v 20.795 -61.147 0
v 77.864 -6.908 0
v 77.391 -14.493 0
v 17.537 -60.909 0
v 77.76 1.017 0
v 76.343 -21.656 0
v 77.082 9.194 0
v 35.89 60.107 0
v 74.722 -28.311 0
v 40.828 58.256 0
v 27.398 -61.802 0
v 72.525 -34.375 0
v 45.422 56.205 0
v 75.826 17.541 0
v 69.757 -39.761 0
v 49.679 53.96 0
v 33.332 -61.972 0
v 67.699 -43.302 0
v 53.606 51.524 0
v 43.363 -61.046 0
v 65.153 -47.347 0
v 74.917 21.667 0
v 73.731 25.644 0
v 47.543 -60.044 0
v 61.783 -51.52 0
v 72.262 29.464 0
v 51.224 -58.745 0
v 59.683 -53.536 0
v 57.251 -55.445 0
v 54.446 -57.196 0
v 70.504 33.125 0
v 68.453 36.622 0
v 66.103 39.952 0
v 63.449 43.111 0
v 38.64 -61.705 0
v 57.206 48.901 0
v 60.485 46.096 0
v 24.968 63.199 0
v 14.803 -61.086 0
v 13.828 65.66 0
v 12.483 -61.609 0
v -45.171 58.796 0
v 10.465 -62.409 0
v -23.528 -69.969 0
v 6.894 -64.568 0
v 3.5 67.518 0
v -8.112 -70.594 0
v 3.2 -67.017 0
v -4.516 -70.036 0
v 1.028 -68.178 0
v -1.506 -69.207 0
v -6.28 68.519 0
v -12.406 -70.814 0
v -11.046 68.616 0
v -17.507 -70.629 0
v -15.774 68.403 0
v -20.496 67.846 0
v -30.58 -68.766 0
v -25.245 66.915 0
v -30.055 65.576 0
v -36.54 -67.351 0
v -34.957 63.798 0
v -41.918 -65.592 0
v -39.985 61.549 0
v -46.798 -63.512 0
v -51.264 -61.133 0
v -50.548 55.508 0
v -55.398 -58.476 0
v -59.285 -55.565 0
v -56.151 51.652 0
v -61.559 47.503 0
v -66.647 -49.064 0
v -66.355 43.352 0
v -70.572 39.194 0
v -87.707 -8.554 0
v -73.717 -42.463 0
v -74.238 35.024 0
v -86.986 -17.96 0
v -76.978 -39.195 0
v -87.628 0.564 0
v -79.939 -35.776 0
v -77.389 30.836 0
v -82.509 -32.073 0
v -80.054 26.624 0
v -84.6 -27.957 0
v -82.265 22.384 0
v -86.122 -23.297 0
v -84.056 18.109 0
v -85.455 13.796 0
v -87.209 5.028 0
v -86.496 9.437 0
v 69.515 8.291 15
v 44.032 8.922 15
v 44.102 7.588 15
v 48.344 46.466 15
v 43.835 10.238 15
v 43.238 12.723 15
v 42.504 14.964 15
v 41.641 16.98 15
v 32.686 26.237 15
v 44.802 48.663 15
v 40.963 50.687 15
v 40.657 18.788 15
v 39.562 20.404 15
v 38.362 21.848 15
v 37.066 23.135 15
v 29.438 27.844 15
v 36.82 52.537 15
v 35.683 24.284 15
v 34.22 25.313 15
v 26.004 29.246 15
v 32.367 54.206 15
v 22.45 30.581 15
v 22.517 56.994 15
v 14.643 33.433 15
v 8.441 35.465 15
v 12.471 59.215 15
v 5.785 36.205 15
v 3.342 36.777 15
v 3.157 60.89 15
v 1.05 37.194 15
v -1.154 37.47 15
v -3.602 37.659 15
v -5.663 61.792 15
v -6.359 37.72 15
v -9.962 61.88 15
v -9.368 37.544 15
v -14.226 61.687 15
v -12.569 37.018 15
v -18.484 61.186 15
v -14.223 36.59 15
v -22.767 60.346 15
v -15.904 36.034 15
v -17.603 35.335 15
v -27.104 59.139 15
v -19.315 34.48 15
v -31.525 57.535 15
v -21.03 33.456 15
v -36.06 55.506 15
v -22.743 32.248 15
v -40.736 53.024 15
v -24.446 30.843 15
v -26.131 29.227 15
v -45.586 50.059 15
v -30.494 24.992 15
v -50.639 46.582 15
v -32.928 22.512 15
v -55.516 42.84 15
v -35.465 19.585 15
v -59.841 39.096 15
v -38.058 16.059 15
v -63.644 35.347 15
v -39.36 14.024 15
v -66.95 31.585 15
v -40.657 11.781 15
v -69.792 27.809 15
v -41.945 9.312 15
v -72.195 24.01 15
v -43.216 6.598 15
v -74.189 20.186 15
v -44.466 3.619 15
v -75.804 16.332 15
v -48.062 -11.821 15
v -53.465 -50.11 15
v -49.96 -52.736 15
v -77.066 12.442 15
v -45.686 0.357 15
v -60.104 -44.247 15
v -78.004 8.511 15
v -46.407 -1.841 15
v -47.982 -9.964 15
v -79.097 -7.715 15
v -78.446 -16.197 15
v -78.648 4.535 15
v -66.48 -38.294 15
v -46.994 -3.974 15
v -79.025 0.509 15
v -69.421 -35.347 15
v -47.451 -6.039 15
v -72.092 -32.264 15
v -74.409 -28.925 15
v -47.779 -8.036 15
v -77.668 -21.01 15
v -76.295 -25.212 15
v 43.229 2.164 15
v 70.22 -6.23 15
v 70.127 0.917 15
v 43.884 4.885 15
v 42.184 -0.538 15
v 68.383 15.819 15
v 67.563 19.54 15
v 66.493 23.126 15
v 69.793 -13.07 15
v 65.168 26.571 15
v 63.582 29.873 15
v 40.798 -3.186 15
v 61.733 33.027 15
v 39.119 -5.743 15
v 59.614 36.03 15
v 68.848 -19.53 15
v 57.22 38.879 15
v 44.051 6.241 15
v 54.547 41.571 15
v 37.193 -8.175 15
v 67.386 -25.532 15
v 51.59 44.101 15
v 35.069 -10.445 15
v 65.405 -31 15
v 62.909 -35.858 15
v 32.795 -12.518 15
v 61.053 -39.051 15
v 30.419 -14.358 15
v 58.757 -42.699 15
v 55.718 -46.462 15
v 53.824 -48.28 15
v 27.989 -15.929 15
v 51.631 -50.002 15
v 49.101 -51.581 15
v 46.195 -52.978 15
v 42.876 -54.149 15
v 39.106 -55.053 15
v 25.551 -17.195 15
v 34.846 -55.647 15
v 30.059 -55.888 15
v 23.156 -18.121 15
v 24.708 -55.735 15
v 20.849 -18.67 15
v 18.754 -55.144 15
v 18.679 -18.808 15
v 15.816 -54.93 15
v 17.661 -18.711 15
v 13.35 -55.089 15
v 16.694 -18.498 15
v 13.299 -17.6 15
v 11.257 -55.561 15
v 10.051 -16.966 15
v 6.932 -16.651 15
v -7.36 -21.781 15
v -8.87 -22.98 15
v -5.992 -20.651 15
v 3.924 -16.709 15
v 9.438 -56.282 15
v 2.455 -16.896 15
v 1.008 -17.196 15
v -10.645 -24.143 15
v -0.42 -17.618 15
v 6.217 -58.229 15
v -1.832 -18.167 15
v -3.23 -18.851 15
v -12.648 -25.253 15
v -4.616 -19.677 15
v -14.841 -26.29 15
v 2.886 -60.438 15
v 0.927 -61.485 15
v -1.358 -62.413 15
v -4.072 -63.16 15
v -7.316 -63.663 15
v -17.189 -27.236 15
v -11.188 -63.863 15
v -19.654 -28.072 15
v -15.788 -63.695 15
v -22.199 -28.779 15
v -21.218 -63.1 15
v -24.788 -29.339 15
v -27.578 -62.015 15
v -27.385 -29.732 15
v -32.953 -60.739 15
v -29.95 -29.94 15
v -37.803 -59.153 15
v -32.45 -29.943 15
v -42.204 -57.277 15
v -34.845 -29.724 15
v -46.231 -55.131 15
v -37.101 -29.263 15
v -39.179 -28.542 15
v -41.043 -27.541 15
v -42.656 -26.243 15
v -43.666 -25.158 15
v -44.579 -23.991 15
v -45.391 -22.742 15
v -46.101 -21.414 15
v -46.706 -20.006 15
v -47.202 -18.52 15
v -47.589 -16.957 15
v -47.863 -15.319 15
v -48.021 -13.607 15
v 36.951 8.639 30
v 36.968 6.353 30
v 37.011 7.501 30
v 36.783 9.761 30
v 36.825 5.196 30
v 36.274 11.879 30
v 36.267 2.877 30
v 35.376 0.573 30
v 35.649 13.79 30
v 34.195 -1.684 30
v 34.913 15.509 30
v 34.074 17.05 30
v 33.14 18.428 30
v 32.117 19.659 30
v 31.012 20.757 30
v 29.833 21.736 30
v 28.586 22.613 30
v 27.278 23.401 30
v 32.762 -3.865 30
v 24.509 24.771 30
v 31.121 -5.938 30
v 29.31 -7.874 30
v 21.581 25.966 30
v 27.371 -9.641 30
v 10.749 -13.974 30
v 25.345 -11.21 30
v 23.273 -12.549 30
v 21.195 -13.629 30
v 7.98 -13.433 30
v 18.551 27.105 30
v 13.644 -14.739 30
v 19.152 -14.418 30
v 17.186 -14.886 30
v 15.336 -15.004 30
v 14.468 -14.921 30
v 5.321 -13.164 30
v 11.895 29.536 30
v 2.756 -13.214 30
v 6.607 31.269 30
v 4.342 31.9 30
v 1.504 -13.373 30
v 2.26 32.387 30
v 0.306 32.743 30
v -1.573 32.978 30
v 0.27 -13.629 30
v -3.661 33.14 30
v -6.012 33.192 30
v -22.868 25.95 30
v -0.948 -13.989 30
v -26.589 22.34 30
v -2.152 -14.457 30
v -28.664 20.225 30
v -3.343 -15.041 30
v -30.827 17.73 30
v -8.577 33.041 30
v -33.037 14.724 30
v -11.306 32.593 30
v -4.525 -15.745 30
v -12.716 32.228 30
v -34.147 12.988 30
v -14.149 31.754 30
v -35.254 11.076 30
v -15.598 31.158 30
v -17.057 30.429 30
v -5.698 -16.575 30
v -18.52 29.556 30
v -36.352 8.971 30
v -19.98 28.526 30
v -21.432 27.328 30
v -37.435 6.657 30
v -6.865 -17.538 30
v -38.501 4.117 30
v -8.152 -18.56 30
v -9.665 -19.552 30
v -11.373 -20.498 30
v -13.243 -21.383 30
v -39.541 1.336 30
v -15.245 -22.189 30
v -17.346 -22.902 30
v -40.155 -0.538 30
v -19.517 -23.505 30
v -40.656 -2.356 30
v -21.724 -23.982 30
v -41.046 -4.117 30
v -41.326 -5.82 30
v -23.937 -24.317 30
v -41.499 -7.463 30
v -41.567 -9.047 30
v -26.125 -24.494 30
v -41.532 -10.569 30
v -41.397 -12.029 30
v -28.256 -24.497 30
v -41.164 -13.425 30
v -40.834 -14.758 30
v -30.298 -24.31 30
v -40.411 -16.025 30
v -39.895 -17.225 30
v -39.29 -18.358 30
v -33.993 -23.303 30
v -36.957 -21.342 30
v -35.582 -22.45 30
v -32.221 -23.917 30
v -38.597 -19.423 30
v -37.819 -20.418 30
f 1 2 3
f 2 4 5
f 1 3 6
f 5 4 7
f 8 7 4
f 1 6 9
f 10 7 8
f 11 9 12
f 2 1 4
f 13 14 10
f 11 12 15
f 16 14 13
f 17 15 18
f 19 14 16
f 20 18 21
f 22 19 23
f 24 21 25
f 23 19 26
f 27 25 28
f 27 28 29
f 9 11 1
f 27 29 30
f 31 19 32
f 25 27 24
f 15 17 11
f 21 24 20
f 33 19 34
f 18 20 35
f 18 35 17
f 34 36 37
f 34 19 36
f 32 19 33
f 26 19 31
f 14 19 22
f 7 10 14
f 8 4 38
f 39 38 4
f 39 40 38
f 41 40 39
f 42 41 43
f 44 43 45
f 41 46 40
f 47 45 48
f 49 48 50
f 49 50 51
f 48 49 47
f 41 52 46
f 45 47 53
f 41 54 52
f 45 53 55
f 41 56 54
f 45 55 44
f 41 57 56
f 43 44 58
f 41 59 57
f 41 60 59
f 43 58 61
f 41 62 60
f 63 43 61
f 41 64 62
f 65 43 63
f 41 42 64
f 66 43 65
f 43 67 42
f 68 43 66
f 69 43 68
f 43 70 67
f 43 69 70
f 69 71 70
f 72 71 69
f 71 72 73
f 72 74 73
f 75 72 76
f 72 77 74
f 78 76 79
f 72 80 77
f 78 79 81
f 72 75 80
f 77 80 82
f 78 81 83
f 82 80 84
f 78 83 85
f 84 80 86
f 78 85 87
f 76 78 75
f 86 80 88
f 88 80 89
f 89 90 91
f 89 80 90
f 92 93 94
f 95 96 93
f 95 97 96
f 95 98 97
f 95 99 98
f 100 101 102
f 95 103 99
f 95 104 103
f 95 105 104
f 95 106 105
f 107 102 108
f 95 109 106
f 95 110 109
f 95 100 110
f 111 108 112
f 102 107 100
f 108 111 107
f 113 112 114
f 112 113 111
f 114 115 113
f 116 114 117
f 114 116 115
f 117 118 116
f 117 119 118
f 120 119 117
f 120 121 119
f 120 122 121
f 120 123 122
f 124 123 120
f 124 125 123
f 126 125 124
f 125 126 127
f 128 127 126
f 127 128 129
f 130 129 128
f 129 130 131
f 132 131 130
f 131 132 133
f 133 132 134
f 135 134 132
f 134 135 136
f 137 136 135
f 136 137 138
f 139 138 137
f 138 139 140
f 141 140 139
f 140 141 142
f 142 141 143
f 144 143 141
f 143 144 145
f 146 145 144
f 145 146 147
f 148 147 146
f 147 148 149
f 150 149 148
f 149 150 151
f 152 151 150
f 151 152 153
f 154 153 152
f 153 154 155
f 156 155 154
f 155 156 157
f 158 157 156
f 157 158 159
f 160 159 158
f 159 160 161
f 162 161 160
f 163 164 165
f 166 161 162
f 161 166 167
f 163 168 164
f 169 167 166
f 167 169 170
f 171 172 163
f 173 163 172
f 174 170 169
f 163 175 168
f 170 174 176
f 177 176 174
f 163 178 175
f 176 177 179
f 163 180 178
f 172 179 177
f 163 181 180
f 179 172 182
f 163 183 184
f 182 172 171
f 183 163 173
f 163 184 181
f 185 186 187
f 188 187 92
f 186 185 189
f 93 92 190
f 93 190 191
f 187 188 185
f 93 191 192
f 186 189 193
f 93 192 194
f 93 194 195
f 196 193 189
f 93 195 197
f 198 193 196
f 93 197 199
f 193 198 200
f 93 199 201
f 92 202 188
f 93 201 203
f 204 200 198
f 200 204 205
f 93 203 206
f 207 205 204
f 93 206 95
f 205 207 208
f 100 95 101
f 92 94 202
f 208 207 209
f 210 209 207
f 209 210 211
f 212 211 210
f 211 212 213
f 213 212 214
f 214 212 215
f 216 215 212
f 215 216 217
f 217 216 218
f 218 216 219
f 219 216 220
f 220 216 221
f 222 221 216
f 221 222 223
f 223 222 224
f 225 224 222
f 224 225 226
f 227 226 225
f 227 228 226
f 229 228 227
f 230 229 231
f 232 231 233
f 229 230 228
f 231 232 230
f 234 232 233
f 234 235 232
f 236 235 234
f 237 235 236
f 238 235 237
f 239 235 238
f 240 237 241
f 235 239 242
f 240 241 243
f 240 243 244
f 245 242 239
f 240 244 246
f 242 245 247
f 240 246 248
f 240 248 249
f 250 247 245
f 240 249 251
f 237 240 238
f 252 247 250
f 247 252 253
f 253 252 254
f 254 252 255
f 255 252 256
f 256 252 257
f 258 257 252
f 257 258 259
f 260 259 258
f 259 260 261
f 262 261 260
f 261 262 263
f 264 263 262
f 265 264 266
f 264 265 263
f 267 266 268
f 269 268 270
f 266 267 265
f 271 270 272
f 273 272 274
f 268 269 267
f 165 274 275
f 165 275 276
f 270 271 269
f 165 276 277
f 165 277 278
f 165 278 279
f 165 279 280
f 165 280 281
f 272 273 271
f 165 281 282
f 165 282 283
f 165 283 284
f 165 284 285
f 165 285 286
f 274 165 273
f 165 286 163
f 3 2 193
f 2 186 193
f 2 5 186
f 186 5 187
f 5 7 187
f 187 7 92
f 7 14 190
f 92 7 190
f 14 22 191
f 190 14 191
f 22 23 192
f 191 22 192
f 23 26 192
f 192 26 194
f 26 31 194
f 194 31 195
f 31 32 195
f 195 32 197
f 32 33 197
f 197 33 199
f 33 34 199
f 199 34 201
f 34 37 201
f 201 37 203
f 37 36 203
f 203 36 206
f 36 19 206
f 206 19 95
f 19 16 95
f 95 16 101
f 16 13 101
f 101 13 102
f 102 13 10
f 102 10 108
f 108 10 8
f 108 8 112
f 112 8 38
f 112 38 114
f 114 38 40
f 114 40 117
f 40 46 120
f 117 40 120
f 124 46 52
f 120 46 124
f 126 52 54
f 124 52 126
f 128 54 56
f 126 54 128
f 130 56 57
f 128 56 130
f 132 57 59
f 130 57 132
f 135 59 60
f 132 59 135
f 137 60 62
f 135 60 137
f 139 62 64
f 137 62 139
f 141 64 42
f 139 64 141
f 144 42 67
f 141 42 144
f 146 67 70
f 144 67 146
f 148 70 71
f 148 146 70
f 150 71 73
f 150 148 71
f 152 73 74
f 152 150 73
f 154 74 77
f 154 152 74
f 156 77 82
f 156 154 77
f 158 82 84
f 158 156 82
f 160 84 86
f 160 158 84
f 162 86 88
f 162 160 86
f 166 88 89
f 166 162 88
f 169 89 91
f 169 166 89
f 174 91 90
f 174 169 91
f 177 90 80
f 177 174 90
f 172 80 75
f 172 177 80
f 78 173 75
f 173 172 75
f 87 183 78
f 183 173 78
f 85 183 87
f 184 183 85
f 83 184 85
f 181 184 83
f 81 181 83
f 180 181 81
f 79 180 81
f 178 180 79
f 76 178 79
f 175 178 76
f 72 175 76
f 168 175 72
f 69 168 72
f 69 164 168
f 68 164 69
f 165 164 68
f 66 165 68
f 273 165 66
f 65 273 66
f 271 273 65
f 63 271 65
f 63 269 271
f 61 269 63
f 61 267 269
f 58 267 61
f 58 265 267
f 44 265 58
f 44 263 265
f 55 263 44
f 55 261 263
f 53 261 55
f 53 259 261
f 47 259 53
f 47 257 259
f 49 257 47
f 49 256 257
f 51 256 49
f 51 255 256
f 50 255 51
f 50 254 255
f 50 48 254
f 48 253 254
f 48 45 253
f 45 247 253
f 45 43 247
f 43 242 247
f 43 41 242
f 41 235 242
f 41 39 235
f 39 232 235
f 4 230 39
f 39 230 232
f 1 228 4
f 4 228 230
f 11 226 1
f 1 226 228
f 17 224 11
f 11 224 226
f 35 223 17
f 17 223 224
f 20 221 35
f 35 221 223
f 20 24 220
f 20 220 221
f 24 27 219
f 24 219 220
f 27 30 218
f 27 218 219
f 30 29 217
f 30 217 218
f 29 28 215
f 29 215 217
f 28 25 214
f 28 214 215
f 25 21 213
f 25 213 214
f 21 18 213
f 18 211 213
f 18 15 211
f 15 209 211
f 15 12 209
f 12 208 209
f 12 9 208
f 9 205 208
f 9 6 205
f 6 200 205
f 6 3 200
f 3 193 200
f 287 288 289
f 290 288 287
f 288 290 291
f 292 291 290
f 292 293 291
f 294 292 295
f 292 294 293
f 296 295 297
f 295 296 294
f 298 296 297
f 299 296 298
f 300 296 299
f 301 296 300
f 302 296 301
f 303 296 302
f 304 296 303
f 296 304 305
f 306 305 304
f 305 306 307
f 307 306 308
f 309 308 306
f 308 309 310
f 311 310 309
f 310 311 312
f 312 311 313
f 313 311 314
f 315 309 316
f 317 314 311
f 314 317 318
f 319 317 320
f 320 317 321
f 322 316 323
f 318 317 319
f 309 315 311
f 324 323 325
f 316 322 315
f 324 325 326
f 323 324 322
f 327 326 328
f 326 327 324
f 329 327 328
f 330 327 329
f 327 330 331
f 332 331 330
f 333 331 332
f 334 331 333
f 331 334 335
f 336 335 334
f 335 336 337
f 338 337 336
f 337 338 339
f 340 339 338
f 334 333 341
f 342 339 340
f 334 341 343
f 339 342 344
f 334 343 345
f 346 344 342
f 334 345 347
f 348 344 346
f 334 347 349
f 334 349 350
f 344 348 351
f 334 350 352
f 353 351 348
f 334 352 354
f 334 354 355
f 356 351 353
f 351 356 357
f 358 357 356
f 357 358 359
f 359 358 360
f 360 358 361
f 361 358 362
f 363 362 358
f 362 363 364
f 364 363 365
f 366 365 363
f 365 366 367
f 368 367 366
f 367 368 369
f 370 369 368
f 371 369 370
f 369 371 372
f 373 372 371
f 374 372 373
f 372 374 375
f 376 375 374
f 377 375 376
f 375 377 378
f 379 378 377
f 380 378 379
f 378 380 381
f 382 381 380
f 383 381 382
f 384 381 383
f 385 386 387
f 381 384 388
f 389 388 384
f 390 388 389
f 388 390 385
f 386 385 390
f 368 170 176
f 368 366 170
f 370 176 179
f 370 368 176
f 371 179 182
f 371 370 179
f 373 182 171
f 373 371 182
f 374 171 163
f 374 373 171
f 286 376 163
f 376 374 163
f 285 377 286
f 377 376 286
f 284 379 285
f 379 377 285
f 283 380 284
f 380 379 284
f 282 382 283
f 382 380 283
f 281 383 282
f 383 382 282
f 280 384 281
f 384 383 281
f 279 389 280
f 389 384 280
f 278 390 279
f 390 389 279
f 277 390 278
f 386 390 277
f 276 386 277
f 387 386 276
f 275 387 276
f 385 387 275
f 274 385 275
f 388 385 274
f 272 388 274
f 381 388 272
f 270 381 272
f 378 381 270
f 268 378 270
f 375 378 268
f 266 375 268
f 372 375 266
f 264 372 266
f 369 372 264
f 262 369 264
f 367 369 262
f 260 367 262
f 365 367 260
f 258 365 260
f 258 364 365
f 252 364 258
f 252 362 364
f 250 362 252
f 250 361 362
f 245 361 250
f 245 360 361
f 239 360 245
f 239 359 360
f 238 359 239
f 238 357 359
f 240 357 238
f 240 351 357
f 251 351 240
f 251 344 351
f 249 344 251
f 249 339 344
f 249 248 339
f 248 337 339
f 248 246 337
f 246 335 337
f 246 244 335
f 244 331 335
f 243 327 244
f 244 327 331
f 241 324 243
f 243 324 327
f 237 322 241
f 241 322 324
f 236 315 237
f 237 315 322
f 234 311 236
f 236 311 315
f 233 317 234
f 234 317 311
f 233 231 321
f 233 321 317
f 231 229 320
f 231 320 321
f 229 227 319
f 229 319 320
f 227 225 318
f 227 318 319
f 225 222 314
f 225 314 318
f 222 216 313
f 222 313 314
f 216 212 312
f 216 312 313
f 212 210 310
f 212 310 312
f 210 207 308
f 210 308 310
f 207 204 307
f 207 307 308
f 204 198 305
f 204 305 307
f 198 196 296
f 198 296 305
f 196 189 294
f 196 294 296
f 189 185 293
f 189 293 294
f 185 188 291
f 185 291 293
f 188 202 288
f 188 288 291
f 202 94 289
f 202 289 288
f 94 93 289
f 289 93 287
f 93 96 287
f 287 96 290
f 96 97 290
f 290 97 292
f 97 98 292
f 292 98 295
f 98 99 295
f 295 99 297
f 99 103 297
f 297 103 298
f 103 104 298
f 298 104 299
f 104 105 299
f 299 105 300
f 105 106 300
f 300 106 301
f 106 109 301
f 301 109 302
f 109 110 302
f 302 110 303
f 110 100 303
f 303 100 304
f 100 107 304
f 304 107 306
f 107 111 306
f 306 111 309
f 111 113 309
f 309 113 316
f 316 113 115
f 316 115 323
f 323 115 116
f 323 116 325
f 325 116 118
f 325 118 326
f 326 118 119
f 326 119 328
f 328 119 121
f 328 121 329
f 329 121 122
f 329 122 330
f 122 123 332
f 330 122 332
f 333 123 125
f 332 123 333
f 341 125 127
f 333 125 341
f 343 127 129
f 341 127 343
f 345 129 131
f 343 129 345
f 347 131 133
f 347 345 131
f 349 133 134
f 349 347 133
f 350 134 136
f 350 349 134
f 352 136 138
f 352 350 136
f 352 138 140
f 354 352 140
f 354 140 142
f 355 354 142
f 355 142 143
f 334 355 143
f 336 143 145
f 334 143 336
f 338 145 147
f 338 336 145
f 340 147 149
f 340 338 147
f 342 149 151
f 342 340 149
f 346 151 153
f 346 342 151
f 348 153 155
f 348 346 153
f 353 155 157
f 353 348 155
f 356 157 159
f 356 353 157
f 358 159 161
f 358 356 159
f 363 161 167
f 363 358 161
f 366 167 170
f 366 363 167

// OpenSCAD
// file: hill-4.scad
use <hillpolygon.scad>

% translate([0,0,155/2]) cube(size=[240, 153, 155], center=true); 

hill4();

module hill4() {
   hillFromPolygon(angle=25) hill4Polygon();
}

// Note: There is something slightly amiss with this polygon, resulting hill ends up with two
//       volumes (?).
module hill4Polygon() {
   // Apologies for the hackish adjustments ... just wanted to get the job done!
   translate([-10,0,0]) rotate([0,0,55]) translate([75,-10,0]) scale([0.8,0.8]) 
      polygon(points=
         [[-140.478, 124.045], [-137.230, 125.810], [-133.814, 127.261],
         [-130.249, 128.407], [-126.551, 129.260], [-118.827, 130.135],
         [-110.782, 129.975], [-102.554, 128.873], [-94.282, 126.918],
         [-86.104, 124.202], [-78.161, 120.815], [-70.590, 116.849],
         [-63.530, 112.395], [-57.120, 107.543], [-51.500, 102.384],
         [-46.807, 97.010], [-43.182, 91.511], [-40.761, 85.978], [-40.047,
         83.228], [-39.685, 80.503], [-38.803, 70.788], [-37.372, 61.707],
         [-35.232, 53.266], [-32.221, 45.469], [-30.339, 41.813], [-28.180,
         38.321], [-25.722, 34.993], [-22.947, 31.830], [-19.833, 28.831],
         [-16.361, 25.998], [-12.511, 23.332], [-8.262, 20.833], [-3.699,
         18.030], [1.024, 14.503], [5.824, 10.330], [10.615, 5.590],
         [15.315, 0.361], [19.839, -5.279], [24.103, -11.252], [28.023,
         -17.479], [31.515, -23.882], [34.496, -30.382], [36.880, -36.903],
         [38.583, -43.364], [39.523, -49.689], [39.615, -55.798], [38.774,
         -61.614], [36.917, -67.058], [35.046, -70.725], [32.867, -74.217],
         [30.379, -77.524], [27.585, -80.639], [24.484, -83.556], [21.077,
         -86.264], [17.366, -88.758], [13.350, -91.029], [9.031, -93.069],
         [4.409, -94.871], [-0.514, -96.427], [-5.739, -97.729], [-11.264,
         -98.769], [-17.089, -99.539], [-23.213, -100.032], [-29.635,
         -100.240], [-39.310, -100.153], [-48.272, -99.722], [-56.565,
         -98.983], [-64.233, -97.967], [-71.320, -96.710], [-77.870,
         -95.245], [-89.537, -91.828], [-99.587, -87.986], [-108.374,
         -83.990], [-123.572, -76.623], [-129.392, -73.760], [-134.677,
         -70.651], [-139.458, -67.328], [-143.761, -63.822], [-147.618,
         -60.167], [-151.056, -56.395], [-154.105, -52.536], [-156.794,
         -48.625], [-161.207, -40.769], [-164.527, -33.084], [-166.987,
         -25.828], [-168.818, -19.258], [-170.193, -13.243], [-171.281,
         -6.864], [-172.108, 0.055], [-172.700, 7.691], [-173.288,
         25.811], [-173.262, 48.900], [-173.153, 59.445], [-172.757,
         69.740], [-171.648, 79.745], [-170.692, 84.627], [-169.398,
         89.422], [-167.713, 94.124], [-165.583, 98.729], [-162.955,
         103.233], [-159.776, 107.629], [-155.992, 111.913], [-151.550,
         116.081], [-146.396, 120.126], [-140.478, 124.045]]
      , paths=
         [[0, 1, 2, 3, 4, 5, 6, 7, 8, 9, 10, 11, 12, 13, 14, 15, 16, 17,
         18, 19, 20, 21, 22, 23, 24, 25, 26, 27, 28, 29, 30, 31, 32, 33,
         34, 35, 36, 37, 38, 39, 40, 41, 42, 43, 44, 45, 46, 47, 48, 49,
         50, 51, 52, 53, 54, 55, 56, 57, 58, 59, 60, 61, 62, 63, 64, 65,
         66, 67, 68, 69, 70, 71, 72, 73, 74, 75, 76, 77, 78, 79, 80, 81,
         82, 83, 84, 85, 86, 87, 88, 89, 90, 91, 92, 93, 94, 95, 96, 97,
         98, 99, 100, 101, 102, 103, 104, 0]]
    );}
// file: hill-3.scad
use <hillpolygon.scad>

% translate([0,0,155/2]) cube(size=[240, 153, 155], center=true);

hill3();

module hill3() {
   hillFromPolygon(angle=25) hill3Polygon();
}

module hill3Polygon() {
   translate([0,30,0]) rotate([0,0,80])
   polygon(points=
    [[-62.336, 77.336], [-53.199, 79.680], [-44.205, 81.185],
    [-39.736, 81.548], [-35.270, 81.611], [-30.797,
    81.343], [-26.306, 80.714], [-21.786, 79.693], [-17.226, 78.252],
    [-12.615, 76.359], [-7.944, 73.983], [-3.200, 71.096], [1.627,
    67.666], [6.548, 63.663], [11.573, 59.058], [16.343, 54.210],
    [20.515, 49.485], [24.126, 44.856], [27.214, 40.295], [29.817,
    35.776], [31.970, 31.272], [33.712, 26.757], [35.080, 22.203],
    [36.111, 17.584], [36.843, 12.873], [37.556, 3.068], [37.520,
    -7.426], [37.030, -18.824], [35.882, -30.117], [34.916, -35.301],
    [33.694, -40.182], [32.223, -44.764], [30.506, -49.054], [28.548,
    -53.055], [26.355, -56.771], [23.930, -60.208], [21.280, -63.371],
    [18.408, -66.263], [15.320, -68.890], [12.020, -71.257], [8.513,
    -73.367], [4.803, -75.226], [0.897, -76.838], [-7.105, -79.524],
    [-15.040, -81.612], [-22.826, -83.090], [-30.378, -83.941], [-37.614,
    -84.153], [-44.450, -83.712], [-50.803, -82.602], [-56.588, -80.811],
    [-60.433, -79.399], [-64.858, -77.594], [-69.553, -75.000], [-71.903,
    -73.282], [-74.205, -71.219], [-76.417, -68.760], [-78.502, -65.856],
    [-80.420, -62.457], [-82.133, -58.514], [-83.602, -53.977], [-84.787,
    -48.796], [-85.650, -42.923], [-86.151, -36.307], [-86.483, -33.057],
    [-87.132, -30.395], [-88.050, -28.201], [-89.188, -26.353], [-91.934,
    -23.211], [-94.987, -19.998], [-96.508, -18.061], [-97.961, -15.744],
    [-99.300, -12.924], [-100.474, -9.479], [-101.437, -5.289], [-102.140,
    -0.233], [-102.536, 5.811], [-102.576, 12.965], [-102.217, 19.080],
    [-101.419, 24.682], [-100.218, 29.849], [-98.650, 34.660], [-96.752,
    39.193], [-94.560, 43.526], [-89.436, 51.905], [-84.163, 60.014],
    [-81.511, 63.793], [-78.658, 67.303], [-75.458, 70.477], [-71.767,
    73.251], [-67.442, 75.559], [-62.336, 77.336]]
    , paths=
    [[0, 1, 2, 3, 4, 5, 6, 7, 8, 9, 10, 11, 12, 13, 14, 15, 16, 17,
    18, 19, 20, 21, 22, 23, 24, 25, 26, 27, 28,
    29, 30, 31, 32, 33, 34, 35, 36, 37, 38, 39, 40, 41, 42, 43, 44, 45,
    46, 47, 48, 49, 50, 51, 52, 53, 54, 55, 56, 57, 58, 59, 60, 61, 62,
    63, 64, 65, 66, 67, 68, 69, 70, 71, 72, 73, 74, 75, 76, 77, 78, 79,
    80, 81, 82, 83, 84, 85, 86, 87, 88, 89, 90, 91, 0]]
    );
}
// file: hillpolygon.scad
module hillFromPolygon(height = 23, angle = 30, convexity = 5) {
   $fn = 100;

   // estRadius calculates an estimated radius for the hill assuming that I've filled most of the
   // depth of the build plate (Y dimension) with the polygon. This is then used to scale the roof of
   // the polyhedral.
   estRadius = 0.95 * 150 / 2;
   inset = height * tan(angle);
   scaleFactor = (estRadius - inset) / estRadius;

   linear_extrude(height = height, convexity = convexity, scale=scaleFactor) child(0);
}
// main file
use <hillpolygon.scad>
use <hill-3.scad>
use <hill-4.scad>

% translate([0,0,155/2]) cube(size=[240, 153, 155], center=true);

hillFromPolygon(angle=25,height=15) hill3Polygon();
translate([-4,7,15]) scale([.45, .45, 1]) rotate([0,0,195]) hillFromPolygon(angle=35,height=15) hill4Polygon();
